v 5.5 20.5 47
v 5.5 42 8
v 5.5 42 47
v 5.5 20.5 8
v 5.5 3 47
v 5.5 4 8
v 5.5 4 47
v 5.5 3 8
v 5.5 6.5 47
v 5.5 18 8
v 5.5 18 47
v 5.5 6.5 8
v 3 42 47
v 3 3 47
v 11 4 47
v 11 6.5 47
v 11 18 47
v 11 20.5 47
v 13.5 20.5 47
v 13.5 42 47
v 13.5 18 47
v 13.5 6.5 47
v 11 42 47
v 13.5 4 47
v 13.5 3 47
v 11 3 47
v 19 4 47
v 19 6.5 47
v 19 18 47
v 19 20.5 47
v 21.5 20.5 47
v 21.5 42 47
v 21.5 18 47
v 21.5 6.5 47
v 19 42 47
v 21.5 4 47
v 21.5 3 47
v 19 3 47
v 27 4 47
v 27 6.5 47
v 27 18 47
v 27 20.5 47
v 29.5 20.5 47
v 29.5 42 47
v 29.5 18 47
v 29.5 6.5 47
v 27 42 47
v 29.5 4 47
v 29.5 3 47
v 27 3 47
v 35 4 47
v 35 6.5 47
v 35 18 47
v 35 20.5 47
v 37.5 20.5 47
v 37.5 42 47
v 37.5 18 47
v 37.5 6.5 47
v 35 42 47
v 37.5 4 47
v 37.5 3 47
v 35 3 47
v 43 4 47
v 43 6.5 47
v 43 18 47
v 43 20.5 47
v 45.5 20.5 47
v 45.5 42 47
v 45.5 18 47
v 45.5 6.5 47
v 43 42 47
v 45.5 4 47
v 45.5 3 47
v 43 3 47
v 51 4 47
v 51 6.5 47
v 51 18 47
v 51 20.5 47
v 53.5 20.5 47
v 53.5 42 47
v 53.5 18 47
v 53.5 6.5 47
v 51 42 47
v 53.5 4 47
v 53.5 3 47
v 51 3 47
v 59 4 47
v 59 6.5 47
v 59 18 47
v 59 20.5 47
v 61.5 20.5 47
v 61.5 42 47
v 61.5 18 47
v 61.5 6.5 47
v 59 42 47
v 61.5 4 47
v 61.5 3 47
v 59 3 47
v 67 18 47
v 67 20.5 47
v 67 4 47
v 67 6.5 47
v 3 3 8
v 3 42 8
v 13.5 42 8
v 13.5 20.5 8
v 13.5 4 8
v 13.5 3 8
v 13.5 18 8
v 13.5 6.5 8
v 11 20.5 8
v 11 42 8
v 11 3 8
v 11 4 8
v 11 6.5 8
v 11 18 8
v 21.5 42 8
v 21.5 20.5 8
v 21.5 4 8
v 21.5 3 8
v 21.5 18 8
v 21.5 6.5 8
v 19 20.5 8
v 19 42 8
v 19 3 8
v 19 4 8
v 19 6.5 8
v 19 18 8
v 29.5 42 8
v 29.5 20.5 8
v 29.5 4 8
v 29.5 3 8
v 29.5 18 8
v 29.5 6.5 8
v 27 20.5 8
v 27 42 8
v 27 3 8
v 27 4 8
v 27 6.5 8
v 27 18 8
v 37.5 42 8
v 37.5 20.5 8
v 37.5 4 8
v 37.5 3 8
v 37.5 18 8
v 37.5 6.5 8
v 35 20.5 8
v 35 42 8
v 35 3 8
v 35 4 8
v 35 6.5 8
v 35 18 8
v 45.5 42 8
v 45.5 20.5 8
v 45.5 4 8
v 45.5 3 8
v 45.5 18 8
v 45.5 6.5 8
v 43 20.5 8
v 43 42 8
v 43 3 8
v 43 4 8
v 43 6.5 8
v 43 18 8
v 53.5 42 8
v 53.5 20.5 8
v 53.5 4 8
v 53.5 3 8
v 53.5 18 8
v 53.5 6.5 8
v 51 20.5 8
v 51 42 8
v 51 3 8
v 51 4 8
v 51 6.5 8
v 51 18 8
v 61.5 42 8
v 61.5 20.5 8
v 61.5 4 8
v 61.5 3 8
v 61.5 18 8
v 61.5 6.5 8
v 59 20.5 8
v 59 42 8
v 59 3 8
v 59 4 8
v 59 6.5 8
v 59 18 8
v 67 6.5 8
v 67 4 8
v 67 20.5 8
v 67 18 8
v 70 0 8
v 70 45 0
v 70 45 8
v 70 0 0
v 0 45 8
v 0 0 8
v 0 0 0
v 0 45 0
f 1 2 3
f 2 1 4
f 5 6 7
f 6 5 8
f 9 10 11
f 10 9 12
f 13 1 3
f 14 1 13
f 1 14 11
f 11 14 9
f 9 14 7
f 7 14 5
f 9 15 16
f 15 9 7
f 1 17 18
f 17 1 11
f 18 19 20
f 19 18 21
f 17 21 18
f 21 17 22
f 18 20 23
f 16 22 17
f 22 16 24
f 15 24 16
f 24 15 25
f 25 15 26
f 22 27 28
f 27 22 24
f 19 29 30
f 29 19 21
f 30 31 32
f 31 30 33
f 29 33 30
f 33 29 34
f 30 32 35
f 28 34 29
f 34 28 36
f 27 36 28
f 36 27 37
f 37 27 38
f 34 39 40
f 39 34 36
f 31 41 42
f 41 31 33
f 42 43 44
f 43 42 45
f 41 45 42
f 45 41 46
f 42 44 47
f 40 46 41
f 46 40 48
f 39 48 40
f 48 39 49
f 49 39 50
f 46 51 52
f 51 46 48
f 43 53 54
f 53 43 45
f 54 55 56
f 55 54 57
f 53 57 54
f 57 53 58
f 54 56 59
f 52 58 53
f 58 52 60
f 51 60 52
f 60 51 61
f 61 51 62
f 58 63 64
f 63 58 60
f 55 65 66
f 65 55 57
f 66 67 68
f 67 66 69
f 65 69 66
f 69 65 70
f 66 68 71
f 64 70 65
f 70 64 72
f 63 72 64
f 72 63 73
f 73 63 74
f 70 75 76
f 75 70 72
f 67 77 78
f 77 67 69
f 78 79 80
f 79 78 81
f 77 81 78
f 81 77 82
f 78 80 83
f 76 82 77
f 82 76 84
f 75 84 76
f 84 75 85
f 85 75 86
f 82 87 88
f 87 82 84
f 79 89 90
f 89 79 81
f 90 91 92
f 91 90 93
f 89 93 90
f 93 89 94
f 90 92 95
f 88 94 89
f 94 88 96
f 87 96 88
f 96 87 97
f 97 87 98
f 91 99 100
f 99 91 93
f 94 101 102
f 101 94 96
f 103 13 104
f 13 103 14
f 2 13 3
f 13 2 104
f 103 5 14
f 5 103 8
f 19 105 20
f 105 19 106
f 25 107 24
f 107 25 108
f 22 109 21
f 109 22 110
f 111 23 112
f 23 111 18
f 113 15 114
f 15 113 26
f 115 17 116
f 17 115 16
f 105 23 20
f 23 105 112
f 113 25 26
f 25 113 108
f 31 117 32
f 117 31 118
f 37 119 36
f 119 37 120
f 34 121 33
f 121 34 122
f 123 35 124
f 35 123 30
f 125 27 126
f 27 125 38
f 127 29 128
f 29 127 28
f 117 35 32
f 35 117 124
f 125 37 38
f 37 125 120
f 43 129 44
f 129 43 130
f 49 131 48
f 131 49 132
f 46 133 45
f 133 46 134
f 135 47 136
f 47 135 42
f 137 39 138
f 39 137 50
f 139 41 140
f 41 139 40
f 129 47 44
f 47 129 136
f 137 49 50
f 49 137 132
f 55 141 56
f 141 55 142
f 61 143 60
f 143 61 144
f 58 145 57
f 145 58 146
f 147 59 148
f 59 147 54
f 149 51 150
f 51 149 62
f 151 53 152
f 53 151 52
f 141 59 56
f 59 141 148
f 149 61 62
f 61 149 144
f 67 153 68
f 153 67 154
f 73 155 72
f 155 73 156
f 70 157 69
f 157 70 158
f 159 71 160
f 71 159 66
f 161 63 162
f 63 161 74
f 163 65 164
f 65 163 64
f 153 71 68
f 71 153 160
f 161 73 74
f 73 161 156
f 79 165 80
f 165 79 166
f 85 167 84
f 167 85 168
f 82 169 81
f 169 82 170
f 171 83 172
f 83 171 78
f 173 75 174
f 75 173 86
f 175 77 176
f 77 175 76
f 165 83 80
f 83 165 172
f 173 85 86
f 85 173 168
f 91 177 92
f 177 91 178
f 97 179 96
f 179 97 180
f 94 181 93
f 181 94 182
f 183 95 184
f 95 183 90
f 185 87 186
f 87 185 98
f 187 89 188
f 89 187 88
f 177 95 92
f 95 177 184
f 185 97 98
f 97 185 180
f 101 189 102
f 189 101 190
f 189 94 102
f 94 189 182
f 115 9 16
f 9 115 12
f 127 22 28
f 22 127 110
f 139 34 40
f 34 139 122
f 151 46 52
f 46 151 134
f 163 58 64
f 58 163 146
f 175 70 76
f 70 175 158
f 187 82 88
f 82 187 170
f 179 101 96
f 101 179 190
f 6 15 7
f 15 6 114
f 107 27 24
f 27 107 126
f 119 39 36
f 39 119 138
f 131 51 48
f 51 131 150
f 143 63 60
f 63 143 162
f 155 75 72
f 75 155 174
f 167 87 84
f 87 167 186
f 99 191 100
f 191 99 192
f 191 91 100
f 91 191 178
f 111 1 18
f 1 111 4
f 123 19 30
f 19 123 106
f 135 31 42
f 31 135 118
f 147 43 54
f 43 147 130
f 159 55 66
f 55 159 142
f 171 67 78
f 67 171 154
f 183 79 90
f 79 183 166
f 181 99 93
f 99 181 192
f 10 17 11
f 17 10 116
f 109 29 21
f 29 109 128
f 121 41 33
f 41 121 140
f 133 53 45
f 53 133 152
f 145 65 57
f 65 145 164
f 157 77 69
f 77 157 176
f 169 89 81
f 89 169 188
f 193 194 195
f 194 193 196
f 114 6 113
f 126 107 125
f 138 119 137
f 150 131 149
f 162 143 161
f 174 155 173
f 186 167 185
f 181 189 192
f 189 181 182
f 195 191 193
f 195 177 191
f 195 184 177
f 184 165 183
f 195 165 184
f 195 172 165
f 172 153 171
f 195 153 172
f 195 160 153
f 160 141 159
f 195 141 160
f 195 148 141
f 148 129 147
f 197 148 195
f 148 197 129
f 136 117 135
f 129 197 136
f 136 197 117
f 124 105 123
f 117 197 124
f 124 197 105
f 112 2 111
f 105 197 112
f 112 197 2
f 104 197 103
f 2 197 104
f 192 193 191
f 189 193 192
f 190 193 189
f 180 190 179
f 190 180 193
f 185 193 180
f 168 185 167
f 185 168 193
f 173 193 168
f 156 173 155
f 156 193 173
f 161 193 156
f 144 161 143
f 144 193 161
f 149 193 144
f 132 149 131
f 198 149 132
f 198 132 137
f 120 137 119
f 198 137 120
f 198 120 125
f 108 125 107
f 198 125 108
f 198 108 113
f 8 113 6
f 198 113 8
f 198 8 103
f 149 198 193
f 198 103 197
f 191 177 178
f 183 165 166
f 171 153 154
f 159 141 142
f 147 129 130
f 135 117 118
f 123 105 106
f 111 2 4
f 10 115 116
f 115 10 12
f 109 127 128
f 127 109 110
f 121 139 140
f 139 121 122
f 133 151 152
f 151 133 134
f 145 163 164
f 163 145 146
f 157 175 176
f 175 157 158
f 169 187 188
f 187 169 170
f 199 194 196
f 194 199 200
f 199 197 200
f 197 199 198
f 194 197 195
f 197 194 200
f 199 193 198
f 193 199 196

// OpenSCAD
$fn = 32;

// ----------------------------------------------------------------------
// Heatsink: cross fin block
// ----------------------------------------------------------------------

// --- parameters (mm) ---
base_l = 70;              // base length, X
base_w = 45;              // base width, Y
base_t = 8;               // base plate thickness
fin_h = 40;               // fin height above the base
fin_t = 2.5;              // fin thickness
edge = 3;                 // margin from the base ends
pitch = 8;                // fin pitch
rib_pitch = 14;           // cross rib pitch
fit_tol = 0.05;           // tolerance for press fits, mm
free_tol = 0.2;           // tolerance for clearance fits, mm

n_fins = floor((base_l - 2 * edge - fin_t) / pitch) + 1;  // fin count
total_h = base_t + fin_h - 1;  // overall height
n_ribs = floor((base_w - 2 * edge) / rib_pitch);  // rib count

union() {
  cube([base_l, base_w, base_t]);
  for (i = [0 : n_fins - 1])
    translate([edge + i * pitch, edge, base_t - 1])
      cube([fin_t, base_w - 2 * edge, fin_h]);
  for (i = [0 : n_ribs - 1])
    translate([edge, edge + 1 + i * rib_pitch, base_t - 1])
      cube([base_l - 2 * edge, fin_t, fin_h]);
}
